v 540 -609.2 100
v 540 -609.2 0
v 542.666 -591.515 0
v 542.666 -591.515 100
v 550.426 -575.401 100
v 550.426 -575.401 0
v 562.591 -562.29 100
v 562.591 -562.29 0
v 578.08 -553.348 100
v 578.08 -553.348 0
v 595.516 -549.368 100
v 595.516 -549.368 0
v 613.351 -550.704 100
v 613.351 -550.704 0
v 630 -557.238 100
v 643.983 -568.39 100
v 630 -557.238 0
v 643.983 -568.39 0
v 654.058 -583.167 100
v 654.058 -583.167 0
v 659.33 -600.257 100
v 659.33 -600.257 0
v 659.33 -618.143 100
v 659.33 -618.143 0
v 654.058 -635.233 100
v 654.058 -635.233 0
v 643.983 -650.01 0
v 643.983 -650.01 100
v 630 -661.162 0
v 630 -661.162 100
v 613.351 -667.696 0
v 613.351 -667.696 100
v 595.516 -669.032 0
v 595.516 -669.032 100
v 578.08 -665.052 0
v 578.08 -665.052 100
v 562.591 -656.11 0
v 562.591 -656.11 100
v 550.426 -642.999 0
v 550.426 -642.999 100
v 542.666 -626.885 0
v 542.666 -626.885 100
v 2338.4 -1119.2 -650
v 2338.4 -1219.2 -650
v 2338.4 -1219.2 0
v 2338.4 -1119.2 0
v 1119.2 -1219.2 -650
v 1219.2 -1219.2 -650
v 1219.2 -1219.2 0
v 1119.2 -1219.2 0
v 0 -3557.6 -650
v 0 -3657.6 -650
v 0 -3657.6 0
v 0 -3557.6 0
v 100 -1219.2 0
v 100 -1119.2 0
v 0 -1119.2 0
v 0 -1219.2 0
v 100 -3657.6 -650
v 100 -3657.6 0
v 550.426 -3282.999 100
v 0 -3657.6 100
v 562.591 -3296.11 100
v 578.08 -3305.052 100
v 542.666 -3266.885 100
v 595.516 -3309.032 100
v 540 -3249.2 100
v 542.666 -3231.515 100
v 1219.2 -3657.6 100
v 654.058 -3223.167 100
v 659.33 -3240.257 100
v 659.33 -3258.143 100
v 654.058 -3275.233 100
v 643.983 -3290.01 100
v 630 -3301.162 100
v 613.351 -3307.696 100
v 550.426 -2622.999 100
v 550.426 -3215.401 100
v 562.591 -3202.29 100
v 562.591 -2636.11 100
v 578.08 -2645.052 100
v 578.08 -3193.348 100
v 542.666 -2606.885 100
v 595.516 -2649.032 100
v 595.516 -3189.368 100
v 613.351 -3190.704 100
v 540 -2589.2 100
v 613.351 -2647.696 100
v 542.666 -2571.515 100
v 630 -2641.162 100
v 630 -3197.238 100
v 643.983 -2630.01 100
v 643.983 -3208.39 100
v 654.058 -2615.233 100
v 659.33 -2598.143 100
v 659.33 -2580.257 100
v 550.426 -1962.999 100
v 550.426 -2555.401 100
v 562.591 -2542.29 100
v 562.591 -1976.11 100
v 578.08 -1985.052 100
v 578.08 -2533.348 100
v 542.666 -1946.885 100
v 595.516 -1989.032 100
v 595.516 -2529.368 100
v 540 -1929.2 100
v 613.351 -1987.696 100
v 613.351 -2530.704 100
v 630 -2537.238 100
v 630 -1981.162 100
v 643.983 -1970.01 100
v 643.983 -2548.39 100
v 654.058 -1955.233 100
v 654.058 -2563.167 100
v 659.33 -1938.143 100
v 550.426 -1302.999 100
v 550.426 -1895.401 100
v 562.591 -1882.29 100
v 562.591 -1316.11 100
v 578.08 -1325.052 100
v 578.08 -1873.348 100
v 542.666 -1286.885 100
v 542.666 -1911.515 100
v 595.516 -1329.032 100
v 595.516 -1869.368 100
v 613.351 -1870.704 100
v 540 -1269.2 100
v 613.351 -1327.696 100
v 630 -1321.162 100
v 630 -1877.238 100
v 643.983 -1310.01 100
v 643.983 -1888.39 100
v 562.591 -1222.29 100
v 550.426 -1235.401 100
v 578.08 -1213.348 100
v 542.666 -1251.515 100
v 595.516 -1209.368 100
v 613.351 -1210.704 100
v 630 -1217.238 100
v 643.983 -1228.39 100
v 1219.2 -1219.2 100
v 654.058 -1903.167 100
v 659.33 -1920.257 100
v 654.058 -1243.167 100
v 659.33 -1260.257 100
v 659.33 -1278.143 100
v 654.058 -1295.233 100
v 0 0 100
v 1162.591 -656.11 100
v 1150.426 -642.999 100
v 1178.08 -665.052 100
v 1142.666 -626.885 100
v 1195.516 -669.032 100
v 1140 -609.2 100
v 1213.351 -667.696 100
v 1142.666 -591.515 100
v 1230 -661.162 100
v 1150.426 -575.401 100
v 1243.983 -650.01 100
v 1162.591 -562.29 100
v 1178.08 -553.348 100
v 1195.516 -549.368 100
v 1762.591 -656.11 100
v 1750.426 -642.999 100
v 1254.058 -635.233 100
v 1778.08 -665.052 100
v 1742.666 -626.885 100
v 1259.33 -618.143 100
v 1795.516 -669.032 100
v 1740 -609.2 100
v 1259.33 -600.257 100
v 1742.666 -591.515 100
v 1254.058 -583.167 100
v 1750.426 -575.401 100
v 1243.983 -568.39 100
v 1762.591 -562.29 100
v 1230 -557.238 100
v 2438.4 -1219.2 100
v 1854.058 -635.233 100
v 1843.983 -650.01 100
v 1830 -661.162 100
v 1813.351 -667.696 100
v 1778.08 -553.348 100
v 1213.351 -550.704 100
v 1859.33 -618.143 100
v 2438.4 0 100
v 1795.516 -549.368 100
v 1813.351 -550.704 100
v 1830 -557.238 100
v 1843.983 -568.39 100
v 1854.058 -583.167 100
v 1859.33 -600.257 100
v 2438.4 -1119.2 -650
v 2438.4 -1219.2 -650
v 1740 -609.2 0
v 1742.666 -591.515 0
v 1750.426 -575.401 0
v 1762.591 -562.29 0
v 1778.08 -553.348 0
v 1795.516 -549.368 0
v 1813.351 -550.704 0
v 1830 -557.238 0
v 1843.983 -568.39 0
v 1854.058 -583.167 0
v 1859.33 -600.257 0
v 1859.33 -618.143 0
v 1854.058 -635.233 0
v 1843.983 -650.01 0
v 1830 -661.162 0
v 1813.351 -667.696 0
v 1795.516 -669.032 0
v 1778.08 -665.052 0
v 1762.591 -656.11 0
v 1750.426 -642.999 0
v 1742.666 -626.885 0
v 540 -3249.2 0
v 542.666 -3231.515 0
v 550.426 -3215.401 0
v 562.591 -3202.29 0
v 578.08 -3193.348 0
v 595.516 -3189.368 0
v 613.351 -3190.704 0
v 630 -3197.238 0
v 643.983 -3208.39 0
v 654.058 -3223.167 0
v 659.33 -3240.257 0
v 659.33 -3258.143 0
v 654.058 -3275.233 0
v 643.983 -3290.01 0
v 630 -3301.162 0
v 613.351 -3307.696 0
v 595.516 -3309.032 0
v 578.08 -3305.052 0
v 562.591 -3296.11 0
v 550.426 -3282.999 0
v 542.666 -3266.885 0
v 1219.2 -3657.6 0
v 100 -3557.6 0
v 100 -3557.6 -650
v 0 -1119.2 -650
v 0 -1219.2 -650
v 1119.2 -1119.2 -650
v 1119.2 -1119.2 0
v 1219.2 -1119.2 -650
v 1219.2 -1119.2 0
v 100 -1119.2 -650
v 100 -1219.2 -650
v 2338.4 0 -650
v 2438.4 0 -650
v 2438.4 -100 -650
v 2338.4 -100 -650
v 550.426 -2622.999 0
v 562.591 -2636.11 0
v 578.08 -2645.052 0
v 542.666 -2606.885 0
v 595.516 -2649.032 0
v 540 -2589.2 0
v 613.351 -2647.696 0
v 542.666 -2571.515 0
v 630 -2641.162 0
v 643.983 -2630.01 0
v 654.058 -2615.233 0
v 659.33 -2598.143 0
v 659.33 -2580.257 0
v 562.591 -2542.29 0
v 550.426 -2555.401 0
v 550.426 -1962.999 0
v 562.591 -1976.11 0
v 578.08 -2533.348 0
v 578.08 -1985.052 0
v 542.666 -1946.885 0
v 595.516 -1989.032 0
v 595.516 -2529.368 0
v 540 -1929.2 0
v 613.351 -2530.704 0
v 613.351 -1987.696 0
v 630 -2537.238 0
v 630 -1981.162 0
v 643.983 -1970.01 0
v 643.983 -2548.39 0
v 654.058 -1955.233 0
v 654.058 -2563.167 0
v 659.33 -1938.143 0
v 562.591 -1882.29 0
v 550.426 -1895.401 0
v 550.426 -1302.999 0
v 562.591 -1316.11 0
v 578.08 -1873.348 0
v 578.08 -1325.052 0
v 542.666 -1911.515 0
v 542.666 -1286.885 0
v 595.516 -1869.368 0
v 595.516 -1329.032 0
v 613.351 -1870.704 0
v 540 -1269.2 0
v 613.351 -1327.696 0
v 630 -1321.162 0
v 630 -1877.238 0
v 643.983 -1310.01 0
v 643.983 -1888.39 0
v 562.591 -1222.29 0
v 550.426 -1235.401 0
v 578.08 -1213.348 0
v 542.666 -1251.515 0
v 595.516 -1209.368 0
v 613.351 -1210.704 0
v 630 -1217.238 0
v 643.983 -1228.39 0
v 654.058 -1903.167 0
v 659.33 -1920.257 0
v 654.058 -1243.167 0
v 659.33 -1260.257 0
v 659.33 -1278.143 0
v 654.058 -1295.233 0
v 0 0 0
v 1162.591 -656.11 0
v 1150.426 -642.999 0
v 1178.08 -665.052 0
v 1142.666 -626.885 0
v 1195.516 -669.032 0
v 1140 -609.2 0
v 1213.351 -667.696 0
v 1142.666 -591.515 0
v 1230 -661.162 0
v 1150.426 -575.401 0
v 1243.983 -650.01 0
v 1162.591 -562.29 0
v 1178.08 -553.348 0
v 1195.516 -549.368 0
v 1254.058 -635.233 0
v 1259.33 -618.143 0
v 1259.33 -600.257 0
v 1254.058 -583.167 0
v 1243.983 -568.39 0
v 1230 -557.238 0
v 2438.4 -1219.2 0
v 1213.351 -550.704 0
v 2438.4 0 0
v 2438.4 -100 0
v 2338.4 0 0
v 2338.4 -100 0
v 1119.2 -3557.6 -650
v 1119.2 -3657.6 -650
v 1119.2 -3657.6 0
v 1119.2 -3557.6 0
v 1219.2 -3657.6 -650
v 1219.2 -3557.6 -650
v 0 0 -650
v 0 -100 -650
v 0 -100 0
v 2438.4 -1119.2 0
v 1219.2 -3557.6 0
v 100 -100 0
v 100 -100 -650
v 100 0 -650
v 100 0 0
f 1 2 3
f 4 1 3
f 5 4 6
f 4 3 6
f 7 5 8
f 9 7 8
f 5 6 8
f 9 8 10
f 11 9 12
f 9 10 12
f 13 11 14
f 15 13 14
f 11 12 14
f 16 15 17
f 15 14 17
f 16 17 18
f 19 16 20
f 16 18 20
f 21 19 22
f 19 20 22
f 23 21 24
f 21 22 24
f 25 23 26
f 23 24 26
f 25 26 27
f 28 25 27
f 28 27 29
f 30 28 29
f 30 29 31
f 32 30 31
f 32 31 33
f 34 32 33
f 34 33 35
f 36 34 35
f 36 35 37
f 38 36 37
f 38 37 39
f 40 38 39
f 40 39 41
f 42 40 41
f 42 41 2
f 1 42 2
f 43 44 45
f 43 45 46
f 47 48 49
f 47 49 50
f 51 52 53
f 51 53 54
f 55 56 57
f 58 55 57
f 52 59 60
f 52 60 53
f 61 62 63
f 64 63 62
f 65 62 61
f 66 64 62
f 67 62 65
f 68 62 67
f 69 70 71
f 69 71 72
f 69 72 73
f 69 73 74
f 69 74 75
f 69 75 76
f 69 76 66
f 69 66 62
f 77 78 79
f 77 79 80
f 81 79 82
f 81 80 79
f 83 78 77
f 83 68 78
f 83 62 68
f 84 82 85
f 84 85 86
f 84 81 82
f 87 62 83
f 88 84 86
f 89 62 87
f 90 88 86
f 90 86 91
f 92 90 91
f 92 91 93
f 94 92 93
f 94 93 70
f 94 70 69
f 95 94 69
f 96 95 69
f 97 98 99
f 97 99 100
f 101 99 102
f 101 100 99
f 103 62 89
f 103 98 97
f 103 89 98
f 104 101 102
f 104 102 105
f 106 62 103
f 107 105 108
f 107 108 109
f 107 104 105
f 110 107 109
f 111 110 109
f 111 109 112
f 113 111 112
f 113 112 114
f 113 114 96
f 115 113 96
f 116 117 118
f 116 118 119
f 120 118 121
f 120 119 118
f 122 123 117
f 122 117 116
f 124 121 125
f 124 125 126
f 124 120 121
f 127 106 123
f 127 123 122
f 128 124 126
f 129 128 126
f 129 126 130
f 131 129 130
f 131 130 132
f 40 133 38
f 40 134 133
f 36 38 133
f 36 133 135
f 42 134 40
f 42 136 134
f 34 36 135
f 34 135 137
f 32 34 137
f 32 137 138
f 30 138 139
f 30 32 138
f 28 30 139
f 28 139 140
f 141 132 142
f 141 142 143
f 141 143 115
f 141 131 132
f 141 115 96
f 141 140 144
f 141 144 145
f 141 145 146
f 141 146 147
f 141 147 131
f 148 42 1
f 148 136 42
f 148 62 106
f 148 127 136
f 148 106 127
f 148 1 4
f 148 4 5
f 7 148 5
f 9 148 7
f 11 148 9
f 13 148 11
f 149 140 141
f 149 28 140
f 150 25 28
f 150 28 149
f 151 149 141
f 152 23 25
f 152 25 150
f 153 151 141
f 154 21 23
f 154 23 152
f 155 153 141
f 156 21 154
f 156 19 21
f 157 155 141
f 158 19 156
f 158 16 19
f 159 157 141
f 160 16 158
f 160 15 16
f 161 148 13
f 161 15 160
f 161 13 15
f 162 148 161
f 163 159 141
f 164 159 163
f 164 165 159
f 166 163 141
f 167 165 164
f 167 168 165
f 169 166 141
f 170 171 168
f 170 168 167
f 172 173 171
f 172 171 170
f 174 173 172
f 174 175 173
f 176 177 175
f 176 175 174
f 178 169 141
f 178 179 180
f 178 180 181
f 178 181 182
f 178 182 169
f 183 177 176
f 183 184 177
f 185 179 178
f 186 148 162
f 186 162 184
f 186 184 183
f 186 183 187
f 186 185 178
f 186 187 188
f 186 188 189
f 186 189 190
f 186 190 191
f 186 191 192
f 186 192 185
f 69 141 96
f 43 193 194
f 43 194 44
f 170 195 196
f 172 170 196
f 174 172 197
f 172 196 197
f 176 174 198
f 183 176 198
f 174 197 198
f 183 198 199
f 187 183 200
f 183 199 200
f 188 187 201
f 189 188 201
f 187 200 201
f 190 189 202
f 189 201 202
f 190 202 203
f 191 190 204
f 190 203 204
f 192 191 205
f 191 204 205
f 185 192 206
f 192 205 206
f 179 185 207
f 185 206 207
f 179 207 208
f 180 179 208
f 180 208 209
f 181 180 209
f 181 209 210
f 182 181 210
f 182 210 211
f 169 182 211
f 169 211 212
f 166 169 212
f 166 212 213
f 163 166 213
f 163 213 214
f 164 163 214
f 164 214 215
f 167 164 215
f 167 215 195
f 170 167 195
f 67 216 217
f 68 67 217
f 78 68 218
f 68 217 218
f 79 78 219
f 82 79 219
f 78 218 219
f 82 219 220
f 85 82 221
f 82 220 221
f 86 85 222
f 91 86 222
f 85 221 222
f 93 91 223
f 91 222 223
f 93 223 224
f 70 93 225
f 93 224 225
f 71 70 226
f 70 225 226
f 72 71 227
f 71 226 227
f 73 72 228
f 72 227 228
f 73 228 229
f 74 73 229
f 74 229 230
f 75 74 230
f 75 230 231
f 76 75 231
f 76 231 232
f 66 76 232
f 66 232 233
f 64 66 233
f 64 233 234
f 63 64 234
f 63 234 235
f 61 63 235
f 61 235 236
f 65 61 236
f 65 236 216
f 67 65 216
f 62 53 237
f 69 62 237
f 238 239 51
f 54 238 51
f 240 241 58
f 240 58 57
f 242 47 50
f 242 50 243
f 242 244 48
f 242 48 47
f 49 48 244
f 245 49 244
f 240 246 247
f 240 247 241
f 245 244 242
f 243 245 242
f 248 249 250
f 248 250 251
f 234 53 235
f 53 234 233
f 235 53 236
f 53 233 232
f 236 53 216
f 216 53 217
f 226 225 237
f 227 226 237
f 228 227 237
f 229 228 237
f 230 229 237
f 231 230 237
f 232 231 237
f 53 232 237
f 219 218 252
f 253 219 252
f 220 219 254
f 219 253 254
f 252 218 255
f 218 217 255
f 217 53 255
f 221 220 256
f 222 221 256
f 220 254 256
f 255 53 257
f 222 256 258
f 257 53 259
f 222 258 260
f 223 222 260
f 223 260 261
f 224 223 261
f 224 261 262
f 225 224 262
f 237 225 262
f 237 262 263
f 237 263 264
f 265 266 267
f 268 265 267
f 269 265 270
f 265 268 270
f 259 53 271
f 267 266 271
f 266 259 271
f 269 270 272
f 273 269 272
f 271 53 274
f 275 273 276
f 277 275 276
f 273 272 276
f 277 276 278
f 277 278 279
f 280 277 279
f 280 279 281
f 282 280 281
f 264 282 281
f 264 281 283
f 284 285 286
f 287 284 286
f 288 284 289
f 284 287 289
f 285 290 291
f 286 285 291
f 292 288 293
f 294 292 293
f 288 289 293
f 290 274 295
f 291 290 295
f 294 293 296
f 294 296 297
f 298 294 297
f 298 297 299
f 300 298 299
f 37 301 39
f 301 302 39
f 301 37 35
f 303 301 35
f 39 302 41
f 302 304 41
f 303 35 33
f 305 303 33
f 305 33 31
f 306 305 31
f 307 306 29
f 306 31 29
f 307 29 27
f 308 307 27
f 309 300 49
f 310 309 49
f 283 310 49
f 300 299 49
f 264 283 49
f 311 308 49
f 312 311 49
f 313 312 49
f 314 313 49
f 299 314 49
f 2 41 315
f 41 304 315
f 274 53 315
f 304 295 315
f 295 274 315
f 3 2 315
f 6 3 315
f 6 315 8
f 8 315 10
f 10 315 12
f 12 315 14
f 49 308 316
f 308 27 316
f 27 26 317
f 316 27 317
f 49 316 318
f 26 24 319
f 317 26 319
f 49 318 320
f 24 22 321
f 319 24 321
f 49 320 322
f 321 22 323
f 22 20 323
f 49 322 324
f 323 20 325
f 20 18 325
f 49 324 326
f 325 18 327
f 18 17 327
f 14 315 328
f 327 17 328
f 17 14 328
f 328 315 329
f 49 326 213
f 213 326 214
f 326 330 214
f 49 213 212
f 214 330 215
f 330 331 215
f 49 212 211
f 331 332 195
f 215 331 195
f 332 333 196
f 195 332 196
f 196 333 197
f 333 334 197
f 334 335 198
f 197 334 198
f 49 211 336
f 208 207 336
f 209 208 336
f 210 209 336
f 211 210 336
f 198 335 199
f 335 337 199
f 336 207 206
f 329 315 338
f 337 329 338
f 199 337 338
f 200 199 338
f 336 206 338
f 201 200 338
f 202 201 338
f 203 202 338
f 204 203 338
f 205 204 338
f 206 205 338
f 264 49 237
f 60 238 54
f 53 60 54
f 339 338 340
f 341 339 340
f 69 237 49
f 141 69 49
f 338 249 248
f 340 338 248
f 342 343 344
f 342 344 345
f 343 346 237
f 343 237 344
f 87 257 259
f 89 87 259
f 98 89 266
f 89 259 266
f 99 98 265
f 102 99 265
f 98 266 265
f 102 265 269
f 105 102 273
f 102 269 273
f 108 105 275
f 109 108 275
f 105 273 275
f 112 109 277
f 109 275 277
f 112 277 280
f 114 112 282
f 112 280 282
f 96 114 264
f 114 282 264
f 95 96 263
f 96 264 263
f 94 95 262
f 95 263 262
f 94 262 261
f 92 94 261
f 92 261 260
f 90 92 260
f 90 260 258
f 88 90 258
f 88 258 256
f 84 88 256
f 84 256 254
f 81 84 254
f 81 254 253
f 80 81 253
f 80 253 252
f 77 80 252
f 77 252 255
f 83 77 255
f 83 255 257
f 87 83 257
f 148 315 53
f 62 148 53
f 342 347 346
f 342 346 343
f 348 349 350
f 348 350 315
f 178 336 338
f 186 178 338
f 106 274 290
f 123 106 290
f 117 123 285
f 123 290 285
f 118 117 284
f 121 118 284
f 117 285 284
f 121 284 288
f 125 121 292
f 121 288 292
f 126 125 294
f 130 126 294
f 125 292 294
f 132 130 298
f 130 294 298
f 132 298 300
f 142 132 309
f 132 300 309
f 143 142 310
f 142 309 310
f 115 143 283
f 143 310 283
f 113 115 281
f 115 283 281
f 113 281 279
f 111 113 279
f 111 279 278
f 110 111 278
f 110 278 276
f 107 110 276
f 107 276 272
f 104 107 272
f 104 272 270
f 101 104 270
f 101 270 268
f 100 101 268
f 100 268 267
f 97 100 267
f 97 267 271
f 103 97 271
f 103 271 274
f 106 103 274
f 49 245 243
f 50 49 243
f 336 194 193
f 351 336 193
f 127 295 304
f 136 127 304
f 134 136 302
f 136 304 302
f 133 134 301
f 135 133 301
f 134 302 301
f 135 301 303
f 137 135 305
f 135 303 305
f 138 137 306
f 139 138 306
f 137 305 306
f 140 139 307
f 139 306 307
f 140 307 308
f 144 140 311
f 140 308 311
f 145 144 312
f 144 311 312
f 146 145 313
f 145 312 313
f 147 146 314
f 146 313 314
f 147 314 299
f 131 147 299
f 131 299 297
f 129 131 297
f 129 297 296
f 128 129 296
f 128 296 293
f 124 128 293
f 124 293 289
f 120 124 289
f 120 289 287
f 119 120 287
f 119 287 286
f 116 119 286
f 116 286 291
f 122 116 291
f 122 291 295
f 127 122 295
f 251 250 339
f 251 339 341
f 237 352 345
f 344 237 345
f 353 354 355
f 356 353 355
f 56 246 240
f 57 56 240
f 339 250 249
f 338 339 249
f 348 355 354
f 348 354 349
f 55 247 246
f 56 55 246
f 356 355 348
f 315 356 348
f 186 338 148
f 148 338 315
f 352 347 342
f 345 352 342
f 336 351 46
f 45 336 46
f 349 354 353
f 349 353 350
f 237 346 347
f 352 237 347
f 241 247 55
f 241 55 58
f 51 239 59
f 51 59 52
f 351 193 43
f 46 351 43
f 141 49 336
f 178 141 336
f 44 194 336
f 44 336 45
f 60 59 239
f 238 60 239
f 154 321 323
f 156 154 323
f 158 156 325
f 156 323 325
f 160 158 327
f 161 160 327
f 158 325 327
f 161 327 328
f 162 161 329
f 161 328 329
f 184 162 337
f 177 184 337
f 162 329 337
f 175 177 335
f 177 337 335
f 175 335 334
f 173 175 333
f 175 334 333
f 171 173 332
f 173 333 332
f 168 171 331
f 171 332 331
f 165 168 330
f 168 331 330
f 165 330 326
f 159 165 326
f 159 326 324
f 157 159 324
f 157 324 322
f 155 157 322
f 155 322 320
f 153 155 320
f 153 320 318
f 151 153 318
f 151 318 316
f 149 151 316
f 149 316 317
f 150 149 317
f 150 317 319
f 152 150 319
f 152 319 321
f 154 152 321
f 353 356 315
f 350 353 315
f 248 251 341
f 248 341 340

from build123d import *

# Parameters (mm, degrees)
BOSS_EXTRUDE1_DEPTH   = 100
SKETCH4_W             = 100
SKETCH4_H             = 100
BOSS_EXTRUDE2_DEPTH   = 650
BOSS_EXTRUDE2_2_DEPTH = 650
BOSS_EXTRUDE2_3_DEPTH = 650
BOSS_EXTRUDE2_4_DEPTH = 650
BOSS_EXTRUDE2_5_DEPTH = 650
BOSS_EXTRUDE2_6_DEPTH = 650
BOSS_EXTRUDE2_7_DEPTH = 650
SKETCH5_R             = 60
CUT_EXTRUDE2_DEPTH    = 101


with BuildPart() as part:
    # Sketch3 → Boss-Extrude1 (new body)
    with BuildSketch(Plane.XY):
        Polygon((2438.4, -1219.2), (2438.4, 0), (0, 0), (0, -3657.6), (1219.2, -3657.6), (1219.2, -1219.2), align=None)
    extrude(amount=BOSS_EXTRUDE1_DEPTH)

    # Sketch5 → Cut-Extrude2 (cut, through all)
    with BuildSketch(Plane(origin=(0, 0, 0), x_dir=(-1, 0, 0), z_dir=(0, 0, -1))):
        with Locations((-600, -3249.2)):
            Circle(SKETCH5_R)
        with Locations((-600, -2589.2)):
            Circle(SKETCH5_R)
        with Locations((-600, -1929.2)):
            Circle(SKETCH5_R)
        with Locations((-600, -1269.2)):
            Circle(SKETCH5_R)
        with Locations((-600, -609.2)):
            Circle(SKETCH5_R)
        with Locations((-1200, -609.2)):
            Circle(SKETCH5_R)
        with Locations((-1800, -609.2)):
            Circle(SKETCH5_R)
    extrude(amount=-CUT_EXTRUDE2_DEPTH, mode=Mode.SUBTRACT)


with BuildPart() as body_2:
    # Sketch4 → Boss-Extrude2 (new body)
    with BuildSketch(Plane(origin=(0, 0, 0), x_dir=(-1, 0, 0), z_dir=(0, 0, -1))):
        with Locations((-2388.4, -50)):
            Rectangle(SKETCH4_W, SKETCH4_H)
    extrude(amount=BOSS_EXTRUDE2_DEPTH)


with BuildPart() as body_3:
    # Sketch4 → Boss-Extrude2 2 (new body)
    with BuildSketch(Plane(origin=(0, 0, 0), x_dir=(-1, 0, 0), z_dir=(0, 0, -1))):
        with Locations((-50, -3607.6)):
            Rectangle(SKETCH4_W, SKETCH4_H)
    extrude(amount=BOSS_EXTRUDE2_2_DEPTH)


with BuildPart() as body_4:
    # Sketch4 → Boss-Extrude2 3 (new body)
    with BuildSketch(Plane(origin=(0, 0, 0), x_dir=(-1, 0, 0), z_dir=(0, 0, -1))):
        with Locations((-50, -50)):
            Rectangle(SKETCH4_W, SKETCH4_H)
    extrude(amount=BOSS_EXTRUDE2_3_DEPTH)


with BuildPart() as body_5:
    # Sketch4 → Boss-Extrude2 4 (new body)
    with BuildSketch(Plane(origin=(0, 0, 0), x_dir=(-1, 0, 0), z_dir=(0, 0, -1))):
        with Locations((-1169.2, -3607.6)):
            Rectangle(SKETCH4_W, SKETCH4_H)
    extrude(amount=BOSS_EXTRUDE2_4_DEPTH)


with BuildPart() as body_6:
    # Sketch4 → Boss-Extrude2 5 (new body)
    with BuildSketch(Plane(origin=(0, 0, 0), x_dir=(-1, 0, 0), z_dir=(0, 0, -1))):
        with Locations((-1169.2, -1169.2)):
            Rectangle(SKETCH4_W, SKETCH4_H)
    extrude(amount=BOSS_EXTRUDE2_5_DEPTH)


with BuildPart() as body_7:
    # Sketch4 → Boss-Extrude2 6 (new body)
    with BuildSketch(Plane(origin=(0, 0, 0), x_dir=(-1, 0, 0), z_dir=(0, 0, -1))):
        with Locations((-2388.4, -1169.2)):
            Rectangle(SKETCH4_W, SKETCH4_H)
    extrude(amount=BOSS_EXTRUDE2_6_DEPTH)


with BuildPart() as body_8:
    # Sketch4 → Boss-Extrude2 7 (new body)
    with BuildSketch(Plane(origin=(0, 0, 0), x_dir=(-1, 0, 0), z_dir=(0, 0, -1))):
        with Locations((-50, -1169.2)):
            Rectangle(SKETCH4_W, SKETCH4_H)
    extrude(amount=BOSS_EXTRUDE2_7_DEPTH)


solid = Compound([part.part, body_2.part, body_3.part, body_4.part, body_5.part, body_6.part, body_7.part, body_8.part])
